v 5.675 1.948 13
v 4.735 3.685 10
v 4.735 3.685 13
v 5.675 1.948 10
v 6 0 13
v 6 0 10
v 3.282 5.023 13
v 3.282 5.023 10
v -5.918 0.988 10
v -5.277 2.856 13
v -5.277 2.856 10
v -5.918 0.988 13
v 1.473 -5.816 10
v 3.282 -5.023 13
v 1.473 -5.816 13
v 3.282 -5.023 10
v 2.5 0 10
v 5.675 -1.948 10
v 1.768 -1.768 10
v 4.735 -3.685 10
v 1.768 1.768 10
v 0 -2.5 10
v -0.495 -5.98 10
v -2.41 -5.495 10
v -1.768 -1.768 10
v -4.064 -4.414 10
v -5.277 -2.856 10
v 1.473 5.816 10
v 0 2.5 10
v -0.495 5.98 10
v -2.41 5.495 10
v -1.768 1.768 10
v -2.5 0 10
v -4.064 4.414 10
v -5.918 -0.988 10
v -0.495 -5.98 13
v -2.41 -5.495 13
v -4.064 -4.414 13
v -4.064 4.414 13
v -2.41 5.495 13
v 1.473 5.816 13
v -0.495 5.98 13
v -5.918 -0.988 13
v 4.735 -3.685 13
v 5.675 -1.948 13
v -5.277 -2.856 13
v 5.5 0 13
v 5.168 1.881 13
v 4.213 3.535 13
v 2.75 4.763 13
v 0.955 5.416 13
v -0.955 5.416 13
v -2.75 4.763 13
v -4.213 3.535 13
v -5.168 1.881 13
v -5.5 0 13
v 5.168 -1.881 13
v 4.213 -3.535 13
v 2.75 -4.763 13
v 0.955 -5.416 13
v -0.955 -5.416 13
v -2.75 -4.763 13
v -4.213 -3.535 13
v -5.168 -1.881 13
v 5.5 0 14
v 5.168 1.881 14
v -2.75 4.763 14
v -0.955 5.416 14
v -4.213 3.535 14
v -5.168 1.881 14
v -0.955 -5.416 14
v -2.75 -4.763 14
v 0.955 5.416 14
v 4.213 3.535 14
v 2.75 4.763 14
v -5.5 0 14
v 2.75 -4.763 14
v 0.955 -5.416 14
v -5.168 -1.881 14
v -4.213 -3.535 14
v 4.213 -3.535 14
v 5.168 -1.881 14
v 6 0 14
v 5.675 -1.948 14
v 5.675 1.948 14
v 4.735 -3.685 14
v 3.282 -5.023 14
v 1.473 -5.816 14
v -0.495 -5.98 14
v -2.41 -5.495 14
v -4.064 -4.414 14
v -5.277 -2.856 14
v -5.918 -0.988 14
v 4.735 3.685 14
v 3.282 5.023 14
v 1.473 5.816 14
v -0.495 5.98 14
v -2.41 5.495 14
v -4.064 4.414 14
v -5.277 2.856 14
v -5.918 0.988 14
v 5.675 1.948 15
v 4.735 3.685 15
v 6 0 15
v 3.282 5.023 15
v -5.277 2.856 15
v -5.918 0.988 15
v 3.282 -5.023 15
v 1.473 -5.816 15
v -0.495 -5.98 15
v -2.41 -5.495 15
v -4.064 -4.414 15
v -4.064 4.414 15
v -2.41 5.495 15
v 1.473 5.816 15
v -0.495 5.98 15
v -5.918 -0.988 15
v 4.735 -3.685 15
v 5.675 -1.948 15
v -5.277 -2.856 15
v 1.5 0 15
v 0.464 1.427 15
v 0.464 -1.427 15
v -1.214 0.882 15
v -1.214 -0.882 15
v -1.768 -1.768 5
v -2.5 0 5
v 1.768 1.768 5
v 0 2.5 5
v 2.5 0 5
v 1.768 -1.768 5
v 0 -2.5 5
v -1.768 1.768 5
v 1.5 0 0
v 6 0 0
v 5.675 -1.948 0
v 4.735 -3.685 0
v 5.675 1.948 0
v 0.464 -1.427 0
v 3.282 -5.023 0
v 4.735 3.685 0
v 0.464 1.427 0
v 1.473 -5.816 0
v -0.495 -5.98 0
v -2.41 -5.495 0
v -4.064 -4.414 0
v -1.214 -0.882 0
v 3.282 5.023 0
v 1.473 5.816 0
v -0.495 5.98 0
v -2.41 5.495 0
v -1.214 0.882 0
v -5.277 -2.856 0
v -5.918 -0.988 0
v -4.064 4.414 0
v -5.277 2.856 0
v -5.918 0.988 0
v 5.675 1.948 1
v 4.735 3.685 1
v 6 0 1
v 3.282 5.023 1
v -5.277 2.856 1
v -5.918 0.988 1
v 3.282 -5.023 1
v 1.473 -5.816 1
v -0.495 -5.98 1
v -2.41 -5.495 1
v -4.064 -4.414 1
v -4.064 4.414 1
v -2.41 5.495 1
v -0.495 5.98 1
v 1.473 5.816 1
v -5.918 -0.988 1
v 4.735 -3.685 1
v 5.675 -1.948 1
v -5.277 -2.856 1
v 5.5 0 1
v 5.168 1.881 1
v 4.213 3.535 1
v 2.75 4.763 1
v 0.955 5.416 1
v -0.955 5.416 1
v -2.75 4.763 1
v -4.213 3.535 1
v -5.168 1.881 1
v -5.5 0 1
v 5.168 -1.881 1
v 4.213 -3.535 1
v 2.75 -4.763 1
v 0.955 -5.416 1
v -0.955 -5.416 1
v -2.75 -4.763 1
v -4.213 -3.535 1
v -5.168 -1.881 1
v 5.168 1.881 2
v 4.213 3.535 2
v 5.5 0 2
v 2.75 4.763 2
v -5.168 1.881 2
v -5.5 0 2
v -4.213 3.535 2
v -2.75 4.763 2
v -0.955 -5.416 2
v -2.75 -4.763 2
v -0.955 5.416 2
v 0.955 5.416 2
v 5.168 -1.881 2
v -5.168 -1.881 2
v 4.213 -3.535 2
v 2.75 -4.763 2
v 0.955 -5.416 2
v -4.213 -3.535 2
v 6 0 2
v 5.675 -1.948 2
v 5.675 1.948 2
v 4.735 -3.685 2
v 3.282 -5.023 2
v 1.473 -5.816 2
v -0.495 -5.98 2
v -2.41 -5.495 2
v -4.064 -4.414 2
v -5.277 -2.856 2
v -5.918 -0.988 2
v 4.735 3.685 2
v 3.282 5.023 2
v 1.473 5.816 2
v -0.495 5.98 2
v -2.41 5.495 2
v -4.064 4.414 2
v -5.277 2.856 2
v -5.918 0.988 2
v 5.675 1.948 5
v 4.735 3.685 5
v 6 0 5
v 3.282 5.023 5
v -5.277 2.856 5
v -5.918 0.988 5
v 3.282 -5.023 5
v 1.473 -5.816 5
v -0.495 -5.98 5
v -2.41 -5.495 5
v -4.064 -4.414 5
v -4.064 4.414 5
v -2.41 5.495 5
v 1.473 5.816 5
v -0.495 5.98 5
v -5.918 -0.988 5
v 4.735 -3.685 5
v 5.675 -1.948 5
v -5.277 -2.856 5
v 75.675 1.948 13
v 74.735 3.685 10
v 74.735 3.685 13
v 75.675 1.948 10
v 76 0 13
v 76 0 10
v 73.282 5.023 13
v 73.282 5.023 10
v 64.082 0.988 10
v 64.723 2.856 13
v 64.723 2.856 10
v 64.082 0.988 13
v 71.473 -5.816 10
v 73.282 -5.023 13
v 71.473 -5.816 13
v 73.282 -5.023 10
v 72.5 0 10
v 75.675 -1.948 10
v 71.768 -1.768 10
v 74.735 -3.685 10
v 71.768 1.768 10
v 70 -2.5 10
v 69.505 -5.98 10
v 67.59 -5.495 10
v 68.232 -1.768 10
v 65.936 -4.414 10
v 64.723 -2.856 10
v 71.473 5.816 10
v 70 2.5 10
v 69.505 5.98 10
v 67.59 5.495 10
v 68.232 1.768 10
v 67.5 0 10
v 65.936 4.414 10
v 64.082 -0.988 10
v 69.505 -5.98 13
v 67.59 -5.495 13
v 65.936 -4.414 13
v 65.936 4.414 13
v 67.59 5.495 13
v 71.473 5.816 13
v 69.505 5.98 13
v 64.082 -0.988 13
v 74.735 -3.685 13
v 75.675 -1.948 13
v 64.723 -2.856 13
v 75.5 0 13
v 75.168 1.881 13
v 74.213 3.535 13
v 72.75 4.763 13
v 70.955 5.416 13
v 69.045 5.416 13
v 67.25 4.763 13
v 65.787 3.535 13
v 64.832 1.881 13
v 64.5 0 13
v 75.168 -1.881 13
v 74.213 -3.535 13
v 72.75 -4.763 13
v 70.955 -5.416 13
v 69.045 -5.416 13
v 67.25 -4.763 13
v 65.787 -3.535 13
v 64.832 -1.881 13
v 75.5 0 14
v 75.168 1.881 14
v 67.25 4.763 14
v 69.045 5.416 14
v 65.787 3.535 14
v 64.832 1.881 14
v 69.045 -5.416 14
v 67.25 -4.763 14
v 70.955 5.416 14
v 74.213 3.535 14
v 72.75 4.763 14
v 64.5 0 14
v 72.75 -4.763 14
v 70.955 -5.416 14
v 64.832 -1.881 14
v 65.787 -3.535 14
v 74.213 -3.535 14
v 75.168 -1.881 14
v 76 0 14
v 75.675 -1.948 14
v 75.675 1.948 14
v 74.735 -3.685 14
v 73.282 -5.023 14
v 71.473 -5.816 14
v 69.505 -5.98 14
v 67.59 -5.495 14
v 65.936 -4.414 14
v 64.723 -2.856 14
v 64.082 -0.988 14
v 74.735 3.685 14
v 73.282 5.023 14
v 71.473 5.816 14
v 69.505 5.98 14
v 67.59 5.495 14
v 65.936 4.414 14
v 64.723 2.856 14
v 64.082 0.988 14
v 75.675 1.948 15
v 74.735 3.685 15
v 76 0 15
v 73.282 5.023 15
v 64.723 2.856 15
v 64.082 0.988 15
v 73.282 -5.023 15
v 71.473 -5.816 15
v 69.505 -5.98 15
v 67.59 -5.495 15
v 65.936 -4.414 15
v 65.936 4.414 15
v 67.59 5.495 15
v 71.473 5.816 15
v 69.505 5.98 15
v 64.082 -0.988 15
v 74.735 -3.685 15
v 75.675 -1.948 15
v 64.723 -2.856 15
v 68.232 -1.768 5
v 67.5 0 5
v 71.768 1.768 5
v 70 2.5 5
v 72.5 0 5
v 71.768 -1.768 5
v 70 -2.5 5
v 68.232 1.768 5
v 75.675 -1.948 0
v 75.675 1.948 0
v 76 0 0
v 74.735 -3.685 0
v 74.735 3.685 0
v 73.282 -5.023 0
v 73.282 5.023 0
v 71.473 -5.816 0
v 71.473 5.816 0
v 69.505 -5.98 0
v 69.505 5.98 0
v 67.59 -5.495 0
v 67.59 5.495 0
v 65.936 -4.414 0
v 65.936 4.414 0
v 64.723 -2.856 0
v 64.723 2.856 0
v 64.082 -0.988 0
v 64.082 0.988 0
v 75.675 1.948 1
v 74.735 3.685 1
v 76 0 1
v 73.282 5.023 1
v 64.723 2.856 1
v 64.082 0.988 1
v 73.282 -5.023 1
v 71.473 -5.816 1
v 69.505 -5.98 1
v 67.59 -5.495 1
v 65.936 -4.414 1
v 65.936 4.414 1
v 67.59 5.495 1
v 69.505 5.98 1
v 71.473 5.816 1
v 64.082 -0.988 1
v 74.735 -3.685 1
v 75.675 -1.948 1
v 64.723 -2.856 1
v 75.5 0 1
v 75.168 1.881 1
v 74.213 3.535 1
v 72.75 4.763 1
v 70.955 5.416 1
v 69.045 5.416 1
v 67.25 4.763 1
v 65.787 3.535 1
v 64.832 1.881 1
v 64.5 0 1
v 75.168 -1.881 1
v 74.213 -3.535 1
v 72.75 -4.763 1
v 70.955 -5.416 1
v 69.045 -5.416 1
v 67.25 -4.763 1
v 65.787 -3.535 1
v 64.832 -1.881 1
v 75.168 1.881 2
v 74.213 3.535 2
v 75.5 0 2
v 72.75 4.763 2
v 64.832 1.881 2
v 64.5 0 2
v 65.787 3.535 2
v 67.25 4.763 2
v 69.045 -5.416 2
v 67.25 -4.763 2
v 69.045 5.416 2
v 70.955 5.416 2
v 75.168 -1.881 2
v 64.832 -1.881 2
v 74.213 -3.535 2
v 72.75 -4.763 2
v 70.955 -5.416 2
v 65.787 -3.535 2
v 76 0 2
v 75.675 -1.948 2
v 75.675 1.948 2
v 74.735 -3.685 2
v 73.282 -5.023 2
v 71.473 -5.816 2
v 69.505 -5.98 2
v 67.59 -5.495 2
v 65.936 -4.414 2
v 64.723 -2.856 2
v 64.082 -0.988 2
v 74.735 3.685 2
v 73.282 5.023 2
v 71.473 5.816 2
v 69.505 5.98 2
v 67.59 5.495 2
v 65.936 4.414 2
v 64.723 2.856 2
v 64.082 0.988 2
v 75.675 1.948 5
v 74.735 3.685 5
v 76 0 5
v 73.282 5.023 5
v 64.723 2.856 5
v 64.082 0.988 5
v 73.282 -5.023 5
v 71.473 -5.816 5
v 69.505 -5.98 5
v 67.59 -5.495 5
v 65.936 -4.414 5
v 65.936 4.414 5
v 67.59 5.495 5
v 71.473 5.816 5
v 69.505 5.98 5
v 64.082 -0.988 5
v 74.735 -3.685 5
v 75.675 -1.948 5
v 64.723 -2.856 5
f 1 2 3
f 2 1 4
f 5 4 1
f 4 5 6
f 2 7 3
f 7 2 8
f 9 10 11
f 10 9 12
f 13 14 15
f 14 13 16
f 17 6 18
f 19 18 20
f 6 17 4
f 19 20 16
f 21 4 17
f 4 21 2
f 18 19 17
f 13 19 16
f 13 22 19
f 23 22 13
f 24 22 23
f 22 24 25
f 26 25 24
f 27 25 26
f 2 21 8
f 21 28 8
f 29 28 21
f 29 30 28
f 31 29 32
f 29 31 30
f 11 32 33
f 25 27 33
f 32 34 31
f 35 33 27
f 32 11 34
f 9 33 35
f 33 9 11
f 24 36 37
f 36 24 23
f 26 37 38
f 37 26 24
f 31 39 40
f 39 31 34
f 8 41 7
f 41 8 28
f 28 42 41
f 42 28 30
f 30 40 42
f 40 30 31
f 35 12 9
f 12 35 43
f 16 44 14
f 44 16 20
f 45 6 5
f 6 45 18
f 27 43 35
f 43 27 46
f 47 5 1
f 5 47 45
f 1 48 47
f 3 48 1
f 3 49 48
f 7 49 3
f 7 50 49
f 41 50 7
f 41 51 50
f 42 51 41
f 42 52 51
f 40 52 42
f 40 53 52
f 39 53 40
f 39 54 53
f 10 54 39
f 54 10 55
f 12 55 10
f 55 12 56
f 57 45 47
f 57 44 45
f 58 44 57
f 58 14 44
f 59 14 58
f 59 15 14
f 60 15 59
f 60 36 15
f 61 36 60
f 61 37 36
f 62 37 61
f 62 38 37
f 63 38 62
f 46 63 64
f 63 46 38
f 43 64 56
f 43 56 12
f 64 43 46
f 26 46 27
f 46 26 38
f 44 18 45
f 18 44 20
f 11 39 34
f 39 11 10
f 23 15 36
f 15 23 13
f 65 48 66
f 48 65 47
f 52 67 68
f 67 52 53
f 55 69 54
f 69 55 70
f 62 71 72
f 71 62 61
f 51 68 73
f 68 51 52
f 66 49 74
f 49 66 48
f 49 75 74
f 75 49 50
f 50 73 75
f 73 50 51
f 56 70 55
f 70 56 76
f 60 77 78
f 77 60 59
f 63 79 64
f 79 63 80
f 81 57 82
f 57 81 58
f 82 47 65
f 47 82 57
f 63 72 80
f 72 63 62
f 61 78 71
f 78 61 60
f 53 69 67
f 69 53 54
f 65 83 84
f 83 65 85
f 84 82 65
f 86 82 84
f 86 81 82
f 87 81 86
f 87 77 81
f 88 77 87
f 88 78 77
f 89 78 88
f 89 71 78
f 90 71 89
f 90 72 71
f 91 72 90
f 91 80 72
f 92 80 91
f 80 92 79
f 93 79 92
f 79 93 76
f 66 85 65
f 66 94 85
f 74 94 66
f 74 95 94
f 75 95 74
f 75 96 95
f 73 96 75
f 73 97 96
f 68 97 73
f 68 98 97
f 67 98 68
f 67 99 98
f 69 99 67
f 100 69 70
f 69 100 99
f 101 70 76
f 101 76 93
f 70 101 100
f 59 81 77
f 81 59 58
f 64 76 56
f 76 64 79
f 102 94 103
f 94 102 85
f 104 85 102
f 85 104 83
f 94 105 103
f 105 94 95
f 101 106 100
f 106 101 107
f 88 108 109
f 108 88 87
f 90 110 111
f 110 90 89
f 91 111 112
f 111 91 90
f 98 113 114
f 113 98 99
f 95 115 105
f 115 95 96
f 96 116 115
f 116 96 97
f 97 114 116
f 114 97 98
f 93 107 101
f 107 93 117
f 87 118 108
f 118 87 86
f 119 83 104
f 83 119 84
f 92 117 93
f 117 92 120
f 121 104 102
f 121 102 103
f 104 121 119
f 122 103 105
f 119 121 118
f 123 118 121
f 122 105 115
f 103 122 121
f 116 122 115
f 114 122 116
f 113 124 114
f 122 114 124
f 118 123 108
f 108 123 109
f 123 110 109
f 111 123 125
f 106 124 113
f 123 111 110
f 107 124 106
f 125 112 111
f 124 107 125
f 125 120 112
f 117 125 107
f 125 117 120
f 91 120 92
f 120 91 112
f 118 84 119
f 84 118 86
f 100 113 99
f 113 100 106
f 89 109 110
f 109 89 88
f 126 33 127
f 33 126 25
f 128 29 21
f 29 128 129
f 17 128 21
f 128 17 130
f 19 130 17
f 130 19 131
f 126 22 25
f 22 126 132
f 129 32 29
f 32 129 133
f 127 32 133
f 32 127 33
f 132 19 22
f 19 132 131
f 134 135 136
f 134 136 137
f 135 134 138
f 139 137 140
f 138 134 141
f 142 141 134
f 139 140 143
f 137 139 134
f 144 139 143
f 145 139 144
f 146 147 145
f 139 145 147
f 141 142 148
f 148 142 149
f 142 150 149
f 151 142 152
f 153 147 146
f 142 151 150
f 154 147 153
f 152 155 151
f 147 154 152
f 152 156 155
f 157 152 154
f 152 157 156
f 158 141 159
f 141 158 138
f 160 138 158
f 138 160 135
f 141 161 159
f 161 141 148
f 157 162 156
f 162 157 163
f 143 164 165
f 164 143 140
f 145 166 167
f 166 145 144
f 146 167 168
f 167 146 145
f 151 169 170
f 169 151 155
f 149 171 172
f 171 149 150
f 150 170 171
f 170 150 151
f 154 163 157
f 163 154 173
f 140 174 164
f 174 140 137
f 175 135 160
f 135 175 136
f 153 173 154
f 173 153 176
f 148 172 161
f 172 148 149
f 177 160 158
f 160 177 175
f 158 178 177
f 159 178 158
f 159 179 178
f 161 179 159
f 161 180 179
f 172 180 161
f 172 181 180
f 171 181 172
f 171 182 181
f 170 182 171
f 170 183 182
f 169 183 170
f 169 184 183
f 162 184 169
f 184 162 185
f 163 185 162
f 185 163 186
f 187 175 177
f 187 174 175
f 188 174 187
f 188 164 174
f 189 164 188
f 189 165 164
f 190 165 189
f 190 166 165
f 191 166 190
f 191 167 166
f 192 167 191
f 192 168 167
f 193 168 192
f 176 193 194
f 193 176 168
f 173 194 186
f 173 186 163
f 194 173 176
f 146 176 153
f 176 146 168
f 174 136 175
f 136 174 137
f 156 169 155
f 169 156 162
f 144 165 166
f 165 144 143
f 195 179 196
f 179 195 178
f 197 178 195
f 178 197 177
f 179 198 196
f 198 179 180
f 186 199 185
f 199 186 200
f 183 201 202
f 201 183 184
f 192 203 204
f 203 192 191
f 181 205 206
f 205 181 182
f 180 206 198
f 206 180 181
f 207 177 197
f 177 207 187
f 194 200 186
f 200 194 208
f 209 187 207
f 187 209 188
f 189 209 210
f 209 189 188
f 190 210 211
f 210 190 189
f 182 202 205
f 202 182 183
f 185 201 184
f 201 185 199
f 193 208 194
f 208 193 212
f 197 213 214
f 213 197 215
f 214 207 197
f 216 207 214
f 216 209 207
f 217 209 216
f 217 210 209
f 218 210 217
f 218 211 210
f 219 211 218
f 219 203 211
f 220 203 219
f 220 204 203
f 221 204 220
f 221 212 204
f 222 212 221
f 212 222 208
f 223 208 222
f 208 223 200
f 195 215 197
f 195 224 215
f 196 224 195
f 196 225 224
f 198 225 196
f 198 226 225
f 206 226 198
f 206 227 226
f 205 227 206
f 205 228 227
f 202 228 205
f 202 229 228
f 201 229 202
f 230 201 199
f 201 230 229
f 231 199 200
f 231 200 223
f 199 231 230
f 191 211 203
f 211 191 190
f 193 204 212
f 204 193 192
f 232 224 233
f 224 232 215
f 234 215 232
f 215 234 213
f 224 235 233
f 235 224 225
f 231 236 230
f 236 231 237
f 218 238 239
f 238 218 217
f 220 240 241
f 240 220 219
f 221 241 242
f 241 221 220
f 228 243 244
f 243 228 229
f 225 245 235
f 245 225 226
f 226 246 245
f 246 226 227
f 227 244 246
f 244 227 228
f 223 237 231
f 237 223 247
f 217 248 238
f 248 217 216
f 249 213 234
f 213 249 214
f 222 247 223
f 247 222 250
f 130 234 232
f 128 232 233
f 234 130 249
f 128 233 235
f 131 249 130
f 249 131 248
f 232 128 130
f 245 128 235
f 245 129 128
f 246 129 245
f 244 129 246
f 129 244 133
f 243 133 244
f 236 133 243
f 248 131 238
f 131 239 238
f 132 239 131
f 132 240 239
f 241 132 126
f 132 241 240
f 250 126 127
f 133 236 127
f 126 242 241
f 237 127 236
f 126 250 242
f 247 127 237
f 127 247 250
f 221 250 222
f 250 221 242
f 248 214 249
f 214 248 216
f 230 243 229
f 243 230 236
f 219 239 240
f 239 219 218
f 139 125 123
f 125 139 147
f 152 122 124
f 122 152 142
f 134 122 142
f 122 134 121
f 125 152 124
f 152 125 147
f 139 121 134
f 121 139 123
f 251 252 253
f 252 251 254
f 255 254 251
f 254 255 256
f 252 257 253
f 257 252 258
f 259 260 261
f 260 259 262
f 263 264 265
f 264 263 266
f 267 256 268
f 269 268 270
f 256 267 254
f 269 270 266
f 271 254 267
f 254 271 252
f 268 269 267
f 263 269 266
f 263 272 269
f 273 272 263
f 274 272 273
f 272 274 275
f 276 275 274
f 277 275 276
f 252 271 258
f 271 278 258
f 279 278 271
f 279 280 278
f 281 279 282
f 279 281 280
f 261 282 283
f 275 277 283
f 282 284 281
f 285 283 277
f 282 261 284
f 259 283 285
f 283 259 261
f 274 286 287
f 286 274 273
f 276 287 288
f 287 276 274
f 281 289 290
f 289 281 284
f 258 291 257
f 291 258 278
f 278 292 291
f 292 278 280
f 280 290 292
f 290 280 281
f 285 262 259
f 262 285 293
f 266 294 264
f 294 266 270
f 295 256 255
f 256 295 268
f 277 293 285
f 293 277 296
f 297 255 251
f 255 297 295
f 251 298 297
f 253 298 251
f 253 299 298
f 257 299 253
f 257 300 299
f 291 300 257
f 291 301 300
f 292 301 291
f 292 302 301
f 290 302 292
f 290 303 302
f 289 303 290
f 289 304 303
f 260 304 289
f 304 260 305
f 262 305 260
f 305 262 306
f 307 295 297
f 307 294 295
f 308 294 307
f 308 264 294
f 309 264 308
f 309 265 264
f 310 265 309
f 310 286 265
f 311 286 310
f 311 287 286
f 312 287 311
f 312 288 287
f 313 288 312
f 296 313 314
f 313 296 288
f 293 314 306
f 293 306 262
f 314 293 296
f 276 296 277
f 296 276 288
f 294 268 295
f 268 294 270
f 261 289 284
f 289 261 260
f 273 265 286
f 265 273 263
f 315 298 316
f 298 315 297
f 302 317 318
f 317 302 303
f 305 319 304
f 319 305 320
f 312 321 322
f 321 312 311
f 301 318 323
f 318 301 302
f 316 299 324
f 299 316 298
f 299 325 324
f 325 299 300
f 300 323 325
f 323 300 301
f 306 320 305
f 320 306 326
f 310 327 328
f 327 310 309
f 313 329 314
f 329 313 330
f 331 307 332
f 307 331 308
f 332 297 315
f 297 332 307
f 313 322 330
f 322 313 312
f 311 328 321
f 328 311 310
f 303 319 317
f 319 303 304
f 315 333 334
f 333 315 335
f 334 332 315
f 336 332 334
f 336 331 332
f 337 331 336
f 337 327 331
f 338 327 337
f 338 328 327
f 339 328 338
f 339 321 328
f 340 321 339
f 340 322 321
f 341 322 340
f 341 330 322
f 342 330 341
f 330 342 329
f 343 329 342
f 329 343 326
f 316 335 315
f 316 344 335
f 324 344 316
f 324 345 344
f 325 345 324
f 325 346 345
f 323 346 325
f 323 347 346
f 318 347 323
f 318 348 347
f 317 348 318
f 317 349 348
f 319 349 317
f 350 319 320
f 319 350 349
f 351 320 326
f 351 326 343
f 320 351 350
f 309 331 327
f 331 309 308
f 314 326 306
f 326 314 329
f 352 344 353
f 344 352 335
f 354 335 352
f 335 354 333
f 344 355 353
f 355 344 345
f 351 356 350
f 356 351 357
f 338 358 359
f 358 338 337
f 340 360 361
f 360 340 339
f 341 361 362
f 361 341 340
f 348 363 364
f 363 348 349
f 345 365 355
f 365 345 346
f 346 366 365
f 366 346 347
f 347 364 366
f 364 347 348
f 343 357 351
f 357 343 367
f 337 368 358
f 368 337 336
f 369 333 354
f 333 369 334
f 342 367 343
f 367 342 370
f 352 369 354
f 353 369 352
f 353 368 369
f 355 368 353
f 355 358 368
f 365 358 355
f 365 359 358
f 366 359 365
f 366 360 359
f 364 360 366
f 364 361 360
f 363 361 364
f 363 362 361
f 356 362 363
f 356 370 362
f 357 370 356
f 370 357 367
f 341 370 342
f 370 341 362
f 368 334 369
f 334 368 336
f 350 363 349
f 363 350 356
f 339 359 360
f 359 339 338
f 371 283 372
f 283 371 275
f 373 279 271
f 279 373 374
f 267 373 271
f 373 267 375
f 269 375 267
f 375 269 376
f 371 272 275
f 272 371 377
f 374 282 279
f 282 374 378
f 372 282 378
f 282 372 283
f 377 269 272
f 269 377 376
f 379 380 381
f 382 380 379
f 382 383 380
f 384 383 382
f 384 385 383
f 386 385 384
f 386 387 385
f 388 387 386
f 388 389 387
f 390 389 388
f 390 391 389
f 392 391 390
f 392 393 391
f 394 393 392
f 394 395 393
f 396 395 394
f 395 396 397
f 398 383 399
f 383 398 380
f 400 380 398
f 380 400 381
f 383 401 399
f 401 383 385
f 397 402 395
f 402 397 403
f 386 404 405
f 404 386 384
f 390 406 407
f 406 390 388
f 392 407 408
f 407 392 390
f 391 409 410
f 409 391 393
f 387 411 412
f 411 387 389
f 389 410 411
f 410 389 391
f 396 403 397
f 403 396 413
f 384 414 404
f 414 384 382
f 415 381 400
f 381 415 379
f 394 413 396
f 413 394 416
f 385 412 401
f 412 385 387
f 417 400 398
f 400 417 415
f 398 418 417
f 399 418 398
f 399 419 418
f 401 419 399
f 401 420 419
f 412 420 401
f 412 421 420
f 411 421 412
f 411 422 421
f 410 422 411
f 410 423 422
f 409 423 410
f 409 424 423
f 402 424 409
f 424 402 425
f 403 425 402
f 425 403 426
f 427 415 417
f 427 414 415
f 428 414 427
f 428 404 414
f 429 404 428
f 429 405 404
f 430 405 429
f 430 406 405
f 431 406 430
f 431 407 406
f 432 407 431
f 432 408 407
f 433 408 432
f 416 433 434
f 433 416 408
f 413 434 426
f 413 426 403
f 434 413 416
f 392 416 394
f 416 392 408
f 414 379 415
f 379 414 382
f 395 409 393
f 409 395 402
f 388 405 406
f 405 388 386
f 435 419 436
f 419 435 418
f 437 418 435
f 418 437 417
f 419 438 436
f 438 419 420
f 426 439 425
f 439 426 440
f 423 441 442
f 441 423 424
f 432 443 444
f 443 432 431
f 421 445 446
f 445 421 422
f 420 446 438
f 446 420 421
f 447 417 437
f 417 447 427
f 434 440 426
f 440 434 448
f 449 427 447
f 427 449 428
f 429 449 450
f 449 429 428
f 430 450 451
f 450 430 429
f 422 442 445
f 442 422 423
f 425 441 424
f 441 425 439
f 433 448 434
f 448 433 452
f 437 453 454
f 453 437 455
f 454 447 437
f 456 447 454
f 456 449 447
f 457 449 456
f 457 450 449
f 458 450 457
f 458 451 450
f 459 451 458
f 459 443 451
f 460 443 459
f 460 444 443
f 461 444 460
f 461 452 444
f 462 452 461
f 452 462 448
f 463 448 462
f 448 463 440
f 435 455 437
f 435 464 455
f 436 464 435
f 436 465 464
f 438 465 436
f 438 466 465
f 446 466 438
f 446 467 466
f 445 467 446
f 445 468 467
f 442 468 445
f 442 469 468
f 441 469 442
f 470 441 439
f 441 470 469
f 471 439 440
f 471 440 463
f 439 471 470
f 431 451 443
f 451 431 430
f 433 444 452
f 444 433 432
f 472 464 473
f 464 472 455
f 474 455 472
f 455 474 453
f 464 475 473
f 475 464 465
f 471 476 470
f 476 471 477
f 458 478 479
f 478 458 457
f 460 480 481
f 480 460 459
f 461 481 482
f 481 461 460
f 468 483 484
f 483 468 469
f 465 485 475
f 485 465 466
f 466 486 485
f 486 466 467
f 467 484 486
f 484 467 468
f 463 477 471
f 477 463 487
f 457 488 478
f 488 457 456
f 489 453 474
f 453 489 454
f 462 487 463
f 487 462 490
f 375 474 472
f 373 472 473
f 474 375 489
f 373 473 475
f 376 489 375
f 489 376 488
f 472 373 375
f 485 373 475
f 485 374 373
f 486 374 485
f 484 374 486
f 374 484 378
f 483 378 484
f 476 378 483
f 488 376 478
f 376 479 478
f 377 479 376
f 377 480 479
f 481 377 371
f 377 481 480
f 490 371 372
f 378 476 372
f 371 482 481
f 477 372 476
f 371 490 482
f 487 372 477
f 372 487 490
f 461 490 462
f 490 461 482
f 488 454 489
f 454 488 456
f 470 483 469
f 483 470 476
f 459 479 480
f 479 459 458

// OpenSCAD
// Se hace primero la estructura sólida, y después se resta el cilindro longitudinal interior para crear el hueco para la tuerca de fijacióno
// La estructura sólida se hace superponiendo cilindros
Altura = 15;
Cilindro_hueco_h = 15;
Cilindro_hueco_d = 3;
Cilindro_interno_base_d = 5;
Cilindro_externo_1 = 1;
Cilindro_externo_2 = 3;
Husillo = 1;
Distancia_cilindros = 70;
Temp = -4;



difference() {

    union() {
        
        
        cylinder(h = Altura, d = Cilindro_interno_base_d, center = false);
        
    
        cylinder(h = 1, d = 12, center = false);
        translate([0,0,1]){
            cylinder(h = 1, d = 11, center = false);
            };
        translate([0,0,2]){
            cylinder(h = 3, d = 12, center = false);
            };
            
            translate([0,0,10]){
                    cylinder(h = 3, d = 12, center = false);
                    translate([0,0,3]){
                        cylinder(h = 1, d = 11, center = false);
                            };
                    translate([0,0,4]){
                    cylinder(h = 1, d = 12, center = false);
                    };
            }           
    };
cylinder(h = 15, d = 3, center = false);
    
};

translate([Distancia_cilindros,0,0]) {
difference() {

    union() {
        
        
        cylinder(h = 15, d = 5, center = false);
        
    
        cylinder(h = 1, d = 12, center = false);
        translate([0,0,1]){
            cylinder(h = 1, d = 11, center = false);
            };
        translate([0,0,2]){
            cylinder(h = 3, d = 12, center = false);
            };
            
            translate([0,0,10]){
                    cylinder(h = 3, d = 12, center = false);
                    translate([0,0,3]){
                        cylinder(h = 1, d = 11, center = false);
                            };
                    translate([0,0,4]){
                    cylinder(h = 1, d = 12, center = false);
                    };
            }           
    };
//cylinder(h = 15, d = 3, center = false);
    
};
};







   


    
